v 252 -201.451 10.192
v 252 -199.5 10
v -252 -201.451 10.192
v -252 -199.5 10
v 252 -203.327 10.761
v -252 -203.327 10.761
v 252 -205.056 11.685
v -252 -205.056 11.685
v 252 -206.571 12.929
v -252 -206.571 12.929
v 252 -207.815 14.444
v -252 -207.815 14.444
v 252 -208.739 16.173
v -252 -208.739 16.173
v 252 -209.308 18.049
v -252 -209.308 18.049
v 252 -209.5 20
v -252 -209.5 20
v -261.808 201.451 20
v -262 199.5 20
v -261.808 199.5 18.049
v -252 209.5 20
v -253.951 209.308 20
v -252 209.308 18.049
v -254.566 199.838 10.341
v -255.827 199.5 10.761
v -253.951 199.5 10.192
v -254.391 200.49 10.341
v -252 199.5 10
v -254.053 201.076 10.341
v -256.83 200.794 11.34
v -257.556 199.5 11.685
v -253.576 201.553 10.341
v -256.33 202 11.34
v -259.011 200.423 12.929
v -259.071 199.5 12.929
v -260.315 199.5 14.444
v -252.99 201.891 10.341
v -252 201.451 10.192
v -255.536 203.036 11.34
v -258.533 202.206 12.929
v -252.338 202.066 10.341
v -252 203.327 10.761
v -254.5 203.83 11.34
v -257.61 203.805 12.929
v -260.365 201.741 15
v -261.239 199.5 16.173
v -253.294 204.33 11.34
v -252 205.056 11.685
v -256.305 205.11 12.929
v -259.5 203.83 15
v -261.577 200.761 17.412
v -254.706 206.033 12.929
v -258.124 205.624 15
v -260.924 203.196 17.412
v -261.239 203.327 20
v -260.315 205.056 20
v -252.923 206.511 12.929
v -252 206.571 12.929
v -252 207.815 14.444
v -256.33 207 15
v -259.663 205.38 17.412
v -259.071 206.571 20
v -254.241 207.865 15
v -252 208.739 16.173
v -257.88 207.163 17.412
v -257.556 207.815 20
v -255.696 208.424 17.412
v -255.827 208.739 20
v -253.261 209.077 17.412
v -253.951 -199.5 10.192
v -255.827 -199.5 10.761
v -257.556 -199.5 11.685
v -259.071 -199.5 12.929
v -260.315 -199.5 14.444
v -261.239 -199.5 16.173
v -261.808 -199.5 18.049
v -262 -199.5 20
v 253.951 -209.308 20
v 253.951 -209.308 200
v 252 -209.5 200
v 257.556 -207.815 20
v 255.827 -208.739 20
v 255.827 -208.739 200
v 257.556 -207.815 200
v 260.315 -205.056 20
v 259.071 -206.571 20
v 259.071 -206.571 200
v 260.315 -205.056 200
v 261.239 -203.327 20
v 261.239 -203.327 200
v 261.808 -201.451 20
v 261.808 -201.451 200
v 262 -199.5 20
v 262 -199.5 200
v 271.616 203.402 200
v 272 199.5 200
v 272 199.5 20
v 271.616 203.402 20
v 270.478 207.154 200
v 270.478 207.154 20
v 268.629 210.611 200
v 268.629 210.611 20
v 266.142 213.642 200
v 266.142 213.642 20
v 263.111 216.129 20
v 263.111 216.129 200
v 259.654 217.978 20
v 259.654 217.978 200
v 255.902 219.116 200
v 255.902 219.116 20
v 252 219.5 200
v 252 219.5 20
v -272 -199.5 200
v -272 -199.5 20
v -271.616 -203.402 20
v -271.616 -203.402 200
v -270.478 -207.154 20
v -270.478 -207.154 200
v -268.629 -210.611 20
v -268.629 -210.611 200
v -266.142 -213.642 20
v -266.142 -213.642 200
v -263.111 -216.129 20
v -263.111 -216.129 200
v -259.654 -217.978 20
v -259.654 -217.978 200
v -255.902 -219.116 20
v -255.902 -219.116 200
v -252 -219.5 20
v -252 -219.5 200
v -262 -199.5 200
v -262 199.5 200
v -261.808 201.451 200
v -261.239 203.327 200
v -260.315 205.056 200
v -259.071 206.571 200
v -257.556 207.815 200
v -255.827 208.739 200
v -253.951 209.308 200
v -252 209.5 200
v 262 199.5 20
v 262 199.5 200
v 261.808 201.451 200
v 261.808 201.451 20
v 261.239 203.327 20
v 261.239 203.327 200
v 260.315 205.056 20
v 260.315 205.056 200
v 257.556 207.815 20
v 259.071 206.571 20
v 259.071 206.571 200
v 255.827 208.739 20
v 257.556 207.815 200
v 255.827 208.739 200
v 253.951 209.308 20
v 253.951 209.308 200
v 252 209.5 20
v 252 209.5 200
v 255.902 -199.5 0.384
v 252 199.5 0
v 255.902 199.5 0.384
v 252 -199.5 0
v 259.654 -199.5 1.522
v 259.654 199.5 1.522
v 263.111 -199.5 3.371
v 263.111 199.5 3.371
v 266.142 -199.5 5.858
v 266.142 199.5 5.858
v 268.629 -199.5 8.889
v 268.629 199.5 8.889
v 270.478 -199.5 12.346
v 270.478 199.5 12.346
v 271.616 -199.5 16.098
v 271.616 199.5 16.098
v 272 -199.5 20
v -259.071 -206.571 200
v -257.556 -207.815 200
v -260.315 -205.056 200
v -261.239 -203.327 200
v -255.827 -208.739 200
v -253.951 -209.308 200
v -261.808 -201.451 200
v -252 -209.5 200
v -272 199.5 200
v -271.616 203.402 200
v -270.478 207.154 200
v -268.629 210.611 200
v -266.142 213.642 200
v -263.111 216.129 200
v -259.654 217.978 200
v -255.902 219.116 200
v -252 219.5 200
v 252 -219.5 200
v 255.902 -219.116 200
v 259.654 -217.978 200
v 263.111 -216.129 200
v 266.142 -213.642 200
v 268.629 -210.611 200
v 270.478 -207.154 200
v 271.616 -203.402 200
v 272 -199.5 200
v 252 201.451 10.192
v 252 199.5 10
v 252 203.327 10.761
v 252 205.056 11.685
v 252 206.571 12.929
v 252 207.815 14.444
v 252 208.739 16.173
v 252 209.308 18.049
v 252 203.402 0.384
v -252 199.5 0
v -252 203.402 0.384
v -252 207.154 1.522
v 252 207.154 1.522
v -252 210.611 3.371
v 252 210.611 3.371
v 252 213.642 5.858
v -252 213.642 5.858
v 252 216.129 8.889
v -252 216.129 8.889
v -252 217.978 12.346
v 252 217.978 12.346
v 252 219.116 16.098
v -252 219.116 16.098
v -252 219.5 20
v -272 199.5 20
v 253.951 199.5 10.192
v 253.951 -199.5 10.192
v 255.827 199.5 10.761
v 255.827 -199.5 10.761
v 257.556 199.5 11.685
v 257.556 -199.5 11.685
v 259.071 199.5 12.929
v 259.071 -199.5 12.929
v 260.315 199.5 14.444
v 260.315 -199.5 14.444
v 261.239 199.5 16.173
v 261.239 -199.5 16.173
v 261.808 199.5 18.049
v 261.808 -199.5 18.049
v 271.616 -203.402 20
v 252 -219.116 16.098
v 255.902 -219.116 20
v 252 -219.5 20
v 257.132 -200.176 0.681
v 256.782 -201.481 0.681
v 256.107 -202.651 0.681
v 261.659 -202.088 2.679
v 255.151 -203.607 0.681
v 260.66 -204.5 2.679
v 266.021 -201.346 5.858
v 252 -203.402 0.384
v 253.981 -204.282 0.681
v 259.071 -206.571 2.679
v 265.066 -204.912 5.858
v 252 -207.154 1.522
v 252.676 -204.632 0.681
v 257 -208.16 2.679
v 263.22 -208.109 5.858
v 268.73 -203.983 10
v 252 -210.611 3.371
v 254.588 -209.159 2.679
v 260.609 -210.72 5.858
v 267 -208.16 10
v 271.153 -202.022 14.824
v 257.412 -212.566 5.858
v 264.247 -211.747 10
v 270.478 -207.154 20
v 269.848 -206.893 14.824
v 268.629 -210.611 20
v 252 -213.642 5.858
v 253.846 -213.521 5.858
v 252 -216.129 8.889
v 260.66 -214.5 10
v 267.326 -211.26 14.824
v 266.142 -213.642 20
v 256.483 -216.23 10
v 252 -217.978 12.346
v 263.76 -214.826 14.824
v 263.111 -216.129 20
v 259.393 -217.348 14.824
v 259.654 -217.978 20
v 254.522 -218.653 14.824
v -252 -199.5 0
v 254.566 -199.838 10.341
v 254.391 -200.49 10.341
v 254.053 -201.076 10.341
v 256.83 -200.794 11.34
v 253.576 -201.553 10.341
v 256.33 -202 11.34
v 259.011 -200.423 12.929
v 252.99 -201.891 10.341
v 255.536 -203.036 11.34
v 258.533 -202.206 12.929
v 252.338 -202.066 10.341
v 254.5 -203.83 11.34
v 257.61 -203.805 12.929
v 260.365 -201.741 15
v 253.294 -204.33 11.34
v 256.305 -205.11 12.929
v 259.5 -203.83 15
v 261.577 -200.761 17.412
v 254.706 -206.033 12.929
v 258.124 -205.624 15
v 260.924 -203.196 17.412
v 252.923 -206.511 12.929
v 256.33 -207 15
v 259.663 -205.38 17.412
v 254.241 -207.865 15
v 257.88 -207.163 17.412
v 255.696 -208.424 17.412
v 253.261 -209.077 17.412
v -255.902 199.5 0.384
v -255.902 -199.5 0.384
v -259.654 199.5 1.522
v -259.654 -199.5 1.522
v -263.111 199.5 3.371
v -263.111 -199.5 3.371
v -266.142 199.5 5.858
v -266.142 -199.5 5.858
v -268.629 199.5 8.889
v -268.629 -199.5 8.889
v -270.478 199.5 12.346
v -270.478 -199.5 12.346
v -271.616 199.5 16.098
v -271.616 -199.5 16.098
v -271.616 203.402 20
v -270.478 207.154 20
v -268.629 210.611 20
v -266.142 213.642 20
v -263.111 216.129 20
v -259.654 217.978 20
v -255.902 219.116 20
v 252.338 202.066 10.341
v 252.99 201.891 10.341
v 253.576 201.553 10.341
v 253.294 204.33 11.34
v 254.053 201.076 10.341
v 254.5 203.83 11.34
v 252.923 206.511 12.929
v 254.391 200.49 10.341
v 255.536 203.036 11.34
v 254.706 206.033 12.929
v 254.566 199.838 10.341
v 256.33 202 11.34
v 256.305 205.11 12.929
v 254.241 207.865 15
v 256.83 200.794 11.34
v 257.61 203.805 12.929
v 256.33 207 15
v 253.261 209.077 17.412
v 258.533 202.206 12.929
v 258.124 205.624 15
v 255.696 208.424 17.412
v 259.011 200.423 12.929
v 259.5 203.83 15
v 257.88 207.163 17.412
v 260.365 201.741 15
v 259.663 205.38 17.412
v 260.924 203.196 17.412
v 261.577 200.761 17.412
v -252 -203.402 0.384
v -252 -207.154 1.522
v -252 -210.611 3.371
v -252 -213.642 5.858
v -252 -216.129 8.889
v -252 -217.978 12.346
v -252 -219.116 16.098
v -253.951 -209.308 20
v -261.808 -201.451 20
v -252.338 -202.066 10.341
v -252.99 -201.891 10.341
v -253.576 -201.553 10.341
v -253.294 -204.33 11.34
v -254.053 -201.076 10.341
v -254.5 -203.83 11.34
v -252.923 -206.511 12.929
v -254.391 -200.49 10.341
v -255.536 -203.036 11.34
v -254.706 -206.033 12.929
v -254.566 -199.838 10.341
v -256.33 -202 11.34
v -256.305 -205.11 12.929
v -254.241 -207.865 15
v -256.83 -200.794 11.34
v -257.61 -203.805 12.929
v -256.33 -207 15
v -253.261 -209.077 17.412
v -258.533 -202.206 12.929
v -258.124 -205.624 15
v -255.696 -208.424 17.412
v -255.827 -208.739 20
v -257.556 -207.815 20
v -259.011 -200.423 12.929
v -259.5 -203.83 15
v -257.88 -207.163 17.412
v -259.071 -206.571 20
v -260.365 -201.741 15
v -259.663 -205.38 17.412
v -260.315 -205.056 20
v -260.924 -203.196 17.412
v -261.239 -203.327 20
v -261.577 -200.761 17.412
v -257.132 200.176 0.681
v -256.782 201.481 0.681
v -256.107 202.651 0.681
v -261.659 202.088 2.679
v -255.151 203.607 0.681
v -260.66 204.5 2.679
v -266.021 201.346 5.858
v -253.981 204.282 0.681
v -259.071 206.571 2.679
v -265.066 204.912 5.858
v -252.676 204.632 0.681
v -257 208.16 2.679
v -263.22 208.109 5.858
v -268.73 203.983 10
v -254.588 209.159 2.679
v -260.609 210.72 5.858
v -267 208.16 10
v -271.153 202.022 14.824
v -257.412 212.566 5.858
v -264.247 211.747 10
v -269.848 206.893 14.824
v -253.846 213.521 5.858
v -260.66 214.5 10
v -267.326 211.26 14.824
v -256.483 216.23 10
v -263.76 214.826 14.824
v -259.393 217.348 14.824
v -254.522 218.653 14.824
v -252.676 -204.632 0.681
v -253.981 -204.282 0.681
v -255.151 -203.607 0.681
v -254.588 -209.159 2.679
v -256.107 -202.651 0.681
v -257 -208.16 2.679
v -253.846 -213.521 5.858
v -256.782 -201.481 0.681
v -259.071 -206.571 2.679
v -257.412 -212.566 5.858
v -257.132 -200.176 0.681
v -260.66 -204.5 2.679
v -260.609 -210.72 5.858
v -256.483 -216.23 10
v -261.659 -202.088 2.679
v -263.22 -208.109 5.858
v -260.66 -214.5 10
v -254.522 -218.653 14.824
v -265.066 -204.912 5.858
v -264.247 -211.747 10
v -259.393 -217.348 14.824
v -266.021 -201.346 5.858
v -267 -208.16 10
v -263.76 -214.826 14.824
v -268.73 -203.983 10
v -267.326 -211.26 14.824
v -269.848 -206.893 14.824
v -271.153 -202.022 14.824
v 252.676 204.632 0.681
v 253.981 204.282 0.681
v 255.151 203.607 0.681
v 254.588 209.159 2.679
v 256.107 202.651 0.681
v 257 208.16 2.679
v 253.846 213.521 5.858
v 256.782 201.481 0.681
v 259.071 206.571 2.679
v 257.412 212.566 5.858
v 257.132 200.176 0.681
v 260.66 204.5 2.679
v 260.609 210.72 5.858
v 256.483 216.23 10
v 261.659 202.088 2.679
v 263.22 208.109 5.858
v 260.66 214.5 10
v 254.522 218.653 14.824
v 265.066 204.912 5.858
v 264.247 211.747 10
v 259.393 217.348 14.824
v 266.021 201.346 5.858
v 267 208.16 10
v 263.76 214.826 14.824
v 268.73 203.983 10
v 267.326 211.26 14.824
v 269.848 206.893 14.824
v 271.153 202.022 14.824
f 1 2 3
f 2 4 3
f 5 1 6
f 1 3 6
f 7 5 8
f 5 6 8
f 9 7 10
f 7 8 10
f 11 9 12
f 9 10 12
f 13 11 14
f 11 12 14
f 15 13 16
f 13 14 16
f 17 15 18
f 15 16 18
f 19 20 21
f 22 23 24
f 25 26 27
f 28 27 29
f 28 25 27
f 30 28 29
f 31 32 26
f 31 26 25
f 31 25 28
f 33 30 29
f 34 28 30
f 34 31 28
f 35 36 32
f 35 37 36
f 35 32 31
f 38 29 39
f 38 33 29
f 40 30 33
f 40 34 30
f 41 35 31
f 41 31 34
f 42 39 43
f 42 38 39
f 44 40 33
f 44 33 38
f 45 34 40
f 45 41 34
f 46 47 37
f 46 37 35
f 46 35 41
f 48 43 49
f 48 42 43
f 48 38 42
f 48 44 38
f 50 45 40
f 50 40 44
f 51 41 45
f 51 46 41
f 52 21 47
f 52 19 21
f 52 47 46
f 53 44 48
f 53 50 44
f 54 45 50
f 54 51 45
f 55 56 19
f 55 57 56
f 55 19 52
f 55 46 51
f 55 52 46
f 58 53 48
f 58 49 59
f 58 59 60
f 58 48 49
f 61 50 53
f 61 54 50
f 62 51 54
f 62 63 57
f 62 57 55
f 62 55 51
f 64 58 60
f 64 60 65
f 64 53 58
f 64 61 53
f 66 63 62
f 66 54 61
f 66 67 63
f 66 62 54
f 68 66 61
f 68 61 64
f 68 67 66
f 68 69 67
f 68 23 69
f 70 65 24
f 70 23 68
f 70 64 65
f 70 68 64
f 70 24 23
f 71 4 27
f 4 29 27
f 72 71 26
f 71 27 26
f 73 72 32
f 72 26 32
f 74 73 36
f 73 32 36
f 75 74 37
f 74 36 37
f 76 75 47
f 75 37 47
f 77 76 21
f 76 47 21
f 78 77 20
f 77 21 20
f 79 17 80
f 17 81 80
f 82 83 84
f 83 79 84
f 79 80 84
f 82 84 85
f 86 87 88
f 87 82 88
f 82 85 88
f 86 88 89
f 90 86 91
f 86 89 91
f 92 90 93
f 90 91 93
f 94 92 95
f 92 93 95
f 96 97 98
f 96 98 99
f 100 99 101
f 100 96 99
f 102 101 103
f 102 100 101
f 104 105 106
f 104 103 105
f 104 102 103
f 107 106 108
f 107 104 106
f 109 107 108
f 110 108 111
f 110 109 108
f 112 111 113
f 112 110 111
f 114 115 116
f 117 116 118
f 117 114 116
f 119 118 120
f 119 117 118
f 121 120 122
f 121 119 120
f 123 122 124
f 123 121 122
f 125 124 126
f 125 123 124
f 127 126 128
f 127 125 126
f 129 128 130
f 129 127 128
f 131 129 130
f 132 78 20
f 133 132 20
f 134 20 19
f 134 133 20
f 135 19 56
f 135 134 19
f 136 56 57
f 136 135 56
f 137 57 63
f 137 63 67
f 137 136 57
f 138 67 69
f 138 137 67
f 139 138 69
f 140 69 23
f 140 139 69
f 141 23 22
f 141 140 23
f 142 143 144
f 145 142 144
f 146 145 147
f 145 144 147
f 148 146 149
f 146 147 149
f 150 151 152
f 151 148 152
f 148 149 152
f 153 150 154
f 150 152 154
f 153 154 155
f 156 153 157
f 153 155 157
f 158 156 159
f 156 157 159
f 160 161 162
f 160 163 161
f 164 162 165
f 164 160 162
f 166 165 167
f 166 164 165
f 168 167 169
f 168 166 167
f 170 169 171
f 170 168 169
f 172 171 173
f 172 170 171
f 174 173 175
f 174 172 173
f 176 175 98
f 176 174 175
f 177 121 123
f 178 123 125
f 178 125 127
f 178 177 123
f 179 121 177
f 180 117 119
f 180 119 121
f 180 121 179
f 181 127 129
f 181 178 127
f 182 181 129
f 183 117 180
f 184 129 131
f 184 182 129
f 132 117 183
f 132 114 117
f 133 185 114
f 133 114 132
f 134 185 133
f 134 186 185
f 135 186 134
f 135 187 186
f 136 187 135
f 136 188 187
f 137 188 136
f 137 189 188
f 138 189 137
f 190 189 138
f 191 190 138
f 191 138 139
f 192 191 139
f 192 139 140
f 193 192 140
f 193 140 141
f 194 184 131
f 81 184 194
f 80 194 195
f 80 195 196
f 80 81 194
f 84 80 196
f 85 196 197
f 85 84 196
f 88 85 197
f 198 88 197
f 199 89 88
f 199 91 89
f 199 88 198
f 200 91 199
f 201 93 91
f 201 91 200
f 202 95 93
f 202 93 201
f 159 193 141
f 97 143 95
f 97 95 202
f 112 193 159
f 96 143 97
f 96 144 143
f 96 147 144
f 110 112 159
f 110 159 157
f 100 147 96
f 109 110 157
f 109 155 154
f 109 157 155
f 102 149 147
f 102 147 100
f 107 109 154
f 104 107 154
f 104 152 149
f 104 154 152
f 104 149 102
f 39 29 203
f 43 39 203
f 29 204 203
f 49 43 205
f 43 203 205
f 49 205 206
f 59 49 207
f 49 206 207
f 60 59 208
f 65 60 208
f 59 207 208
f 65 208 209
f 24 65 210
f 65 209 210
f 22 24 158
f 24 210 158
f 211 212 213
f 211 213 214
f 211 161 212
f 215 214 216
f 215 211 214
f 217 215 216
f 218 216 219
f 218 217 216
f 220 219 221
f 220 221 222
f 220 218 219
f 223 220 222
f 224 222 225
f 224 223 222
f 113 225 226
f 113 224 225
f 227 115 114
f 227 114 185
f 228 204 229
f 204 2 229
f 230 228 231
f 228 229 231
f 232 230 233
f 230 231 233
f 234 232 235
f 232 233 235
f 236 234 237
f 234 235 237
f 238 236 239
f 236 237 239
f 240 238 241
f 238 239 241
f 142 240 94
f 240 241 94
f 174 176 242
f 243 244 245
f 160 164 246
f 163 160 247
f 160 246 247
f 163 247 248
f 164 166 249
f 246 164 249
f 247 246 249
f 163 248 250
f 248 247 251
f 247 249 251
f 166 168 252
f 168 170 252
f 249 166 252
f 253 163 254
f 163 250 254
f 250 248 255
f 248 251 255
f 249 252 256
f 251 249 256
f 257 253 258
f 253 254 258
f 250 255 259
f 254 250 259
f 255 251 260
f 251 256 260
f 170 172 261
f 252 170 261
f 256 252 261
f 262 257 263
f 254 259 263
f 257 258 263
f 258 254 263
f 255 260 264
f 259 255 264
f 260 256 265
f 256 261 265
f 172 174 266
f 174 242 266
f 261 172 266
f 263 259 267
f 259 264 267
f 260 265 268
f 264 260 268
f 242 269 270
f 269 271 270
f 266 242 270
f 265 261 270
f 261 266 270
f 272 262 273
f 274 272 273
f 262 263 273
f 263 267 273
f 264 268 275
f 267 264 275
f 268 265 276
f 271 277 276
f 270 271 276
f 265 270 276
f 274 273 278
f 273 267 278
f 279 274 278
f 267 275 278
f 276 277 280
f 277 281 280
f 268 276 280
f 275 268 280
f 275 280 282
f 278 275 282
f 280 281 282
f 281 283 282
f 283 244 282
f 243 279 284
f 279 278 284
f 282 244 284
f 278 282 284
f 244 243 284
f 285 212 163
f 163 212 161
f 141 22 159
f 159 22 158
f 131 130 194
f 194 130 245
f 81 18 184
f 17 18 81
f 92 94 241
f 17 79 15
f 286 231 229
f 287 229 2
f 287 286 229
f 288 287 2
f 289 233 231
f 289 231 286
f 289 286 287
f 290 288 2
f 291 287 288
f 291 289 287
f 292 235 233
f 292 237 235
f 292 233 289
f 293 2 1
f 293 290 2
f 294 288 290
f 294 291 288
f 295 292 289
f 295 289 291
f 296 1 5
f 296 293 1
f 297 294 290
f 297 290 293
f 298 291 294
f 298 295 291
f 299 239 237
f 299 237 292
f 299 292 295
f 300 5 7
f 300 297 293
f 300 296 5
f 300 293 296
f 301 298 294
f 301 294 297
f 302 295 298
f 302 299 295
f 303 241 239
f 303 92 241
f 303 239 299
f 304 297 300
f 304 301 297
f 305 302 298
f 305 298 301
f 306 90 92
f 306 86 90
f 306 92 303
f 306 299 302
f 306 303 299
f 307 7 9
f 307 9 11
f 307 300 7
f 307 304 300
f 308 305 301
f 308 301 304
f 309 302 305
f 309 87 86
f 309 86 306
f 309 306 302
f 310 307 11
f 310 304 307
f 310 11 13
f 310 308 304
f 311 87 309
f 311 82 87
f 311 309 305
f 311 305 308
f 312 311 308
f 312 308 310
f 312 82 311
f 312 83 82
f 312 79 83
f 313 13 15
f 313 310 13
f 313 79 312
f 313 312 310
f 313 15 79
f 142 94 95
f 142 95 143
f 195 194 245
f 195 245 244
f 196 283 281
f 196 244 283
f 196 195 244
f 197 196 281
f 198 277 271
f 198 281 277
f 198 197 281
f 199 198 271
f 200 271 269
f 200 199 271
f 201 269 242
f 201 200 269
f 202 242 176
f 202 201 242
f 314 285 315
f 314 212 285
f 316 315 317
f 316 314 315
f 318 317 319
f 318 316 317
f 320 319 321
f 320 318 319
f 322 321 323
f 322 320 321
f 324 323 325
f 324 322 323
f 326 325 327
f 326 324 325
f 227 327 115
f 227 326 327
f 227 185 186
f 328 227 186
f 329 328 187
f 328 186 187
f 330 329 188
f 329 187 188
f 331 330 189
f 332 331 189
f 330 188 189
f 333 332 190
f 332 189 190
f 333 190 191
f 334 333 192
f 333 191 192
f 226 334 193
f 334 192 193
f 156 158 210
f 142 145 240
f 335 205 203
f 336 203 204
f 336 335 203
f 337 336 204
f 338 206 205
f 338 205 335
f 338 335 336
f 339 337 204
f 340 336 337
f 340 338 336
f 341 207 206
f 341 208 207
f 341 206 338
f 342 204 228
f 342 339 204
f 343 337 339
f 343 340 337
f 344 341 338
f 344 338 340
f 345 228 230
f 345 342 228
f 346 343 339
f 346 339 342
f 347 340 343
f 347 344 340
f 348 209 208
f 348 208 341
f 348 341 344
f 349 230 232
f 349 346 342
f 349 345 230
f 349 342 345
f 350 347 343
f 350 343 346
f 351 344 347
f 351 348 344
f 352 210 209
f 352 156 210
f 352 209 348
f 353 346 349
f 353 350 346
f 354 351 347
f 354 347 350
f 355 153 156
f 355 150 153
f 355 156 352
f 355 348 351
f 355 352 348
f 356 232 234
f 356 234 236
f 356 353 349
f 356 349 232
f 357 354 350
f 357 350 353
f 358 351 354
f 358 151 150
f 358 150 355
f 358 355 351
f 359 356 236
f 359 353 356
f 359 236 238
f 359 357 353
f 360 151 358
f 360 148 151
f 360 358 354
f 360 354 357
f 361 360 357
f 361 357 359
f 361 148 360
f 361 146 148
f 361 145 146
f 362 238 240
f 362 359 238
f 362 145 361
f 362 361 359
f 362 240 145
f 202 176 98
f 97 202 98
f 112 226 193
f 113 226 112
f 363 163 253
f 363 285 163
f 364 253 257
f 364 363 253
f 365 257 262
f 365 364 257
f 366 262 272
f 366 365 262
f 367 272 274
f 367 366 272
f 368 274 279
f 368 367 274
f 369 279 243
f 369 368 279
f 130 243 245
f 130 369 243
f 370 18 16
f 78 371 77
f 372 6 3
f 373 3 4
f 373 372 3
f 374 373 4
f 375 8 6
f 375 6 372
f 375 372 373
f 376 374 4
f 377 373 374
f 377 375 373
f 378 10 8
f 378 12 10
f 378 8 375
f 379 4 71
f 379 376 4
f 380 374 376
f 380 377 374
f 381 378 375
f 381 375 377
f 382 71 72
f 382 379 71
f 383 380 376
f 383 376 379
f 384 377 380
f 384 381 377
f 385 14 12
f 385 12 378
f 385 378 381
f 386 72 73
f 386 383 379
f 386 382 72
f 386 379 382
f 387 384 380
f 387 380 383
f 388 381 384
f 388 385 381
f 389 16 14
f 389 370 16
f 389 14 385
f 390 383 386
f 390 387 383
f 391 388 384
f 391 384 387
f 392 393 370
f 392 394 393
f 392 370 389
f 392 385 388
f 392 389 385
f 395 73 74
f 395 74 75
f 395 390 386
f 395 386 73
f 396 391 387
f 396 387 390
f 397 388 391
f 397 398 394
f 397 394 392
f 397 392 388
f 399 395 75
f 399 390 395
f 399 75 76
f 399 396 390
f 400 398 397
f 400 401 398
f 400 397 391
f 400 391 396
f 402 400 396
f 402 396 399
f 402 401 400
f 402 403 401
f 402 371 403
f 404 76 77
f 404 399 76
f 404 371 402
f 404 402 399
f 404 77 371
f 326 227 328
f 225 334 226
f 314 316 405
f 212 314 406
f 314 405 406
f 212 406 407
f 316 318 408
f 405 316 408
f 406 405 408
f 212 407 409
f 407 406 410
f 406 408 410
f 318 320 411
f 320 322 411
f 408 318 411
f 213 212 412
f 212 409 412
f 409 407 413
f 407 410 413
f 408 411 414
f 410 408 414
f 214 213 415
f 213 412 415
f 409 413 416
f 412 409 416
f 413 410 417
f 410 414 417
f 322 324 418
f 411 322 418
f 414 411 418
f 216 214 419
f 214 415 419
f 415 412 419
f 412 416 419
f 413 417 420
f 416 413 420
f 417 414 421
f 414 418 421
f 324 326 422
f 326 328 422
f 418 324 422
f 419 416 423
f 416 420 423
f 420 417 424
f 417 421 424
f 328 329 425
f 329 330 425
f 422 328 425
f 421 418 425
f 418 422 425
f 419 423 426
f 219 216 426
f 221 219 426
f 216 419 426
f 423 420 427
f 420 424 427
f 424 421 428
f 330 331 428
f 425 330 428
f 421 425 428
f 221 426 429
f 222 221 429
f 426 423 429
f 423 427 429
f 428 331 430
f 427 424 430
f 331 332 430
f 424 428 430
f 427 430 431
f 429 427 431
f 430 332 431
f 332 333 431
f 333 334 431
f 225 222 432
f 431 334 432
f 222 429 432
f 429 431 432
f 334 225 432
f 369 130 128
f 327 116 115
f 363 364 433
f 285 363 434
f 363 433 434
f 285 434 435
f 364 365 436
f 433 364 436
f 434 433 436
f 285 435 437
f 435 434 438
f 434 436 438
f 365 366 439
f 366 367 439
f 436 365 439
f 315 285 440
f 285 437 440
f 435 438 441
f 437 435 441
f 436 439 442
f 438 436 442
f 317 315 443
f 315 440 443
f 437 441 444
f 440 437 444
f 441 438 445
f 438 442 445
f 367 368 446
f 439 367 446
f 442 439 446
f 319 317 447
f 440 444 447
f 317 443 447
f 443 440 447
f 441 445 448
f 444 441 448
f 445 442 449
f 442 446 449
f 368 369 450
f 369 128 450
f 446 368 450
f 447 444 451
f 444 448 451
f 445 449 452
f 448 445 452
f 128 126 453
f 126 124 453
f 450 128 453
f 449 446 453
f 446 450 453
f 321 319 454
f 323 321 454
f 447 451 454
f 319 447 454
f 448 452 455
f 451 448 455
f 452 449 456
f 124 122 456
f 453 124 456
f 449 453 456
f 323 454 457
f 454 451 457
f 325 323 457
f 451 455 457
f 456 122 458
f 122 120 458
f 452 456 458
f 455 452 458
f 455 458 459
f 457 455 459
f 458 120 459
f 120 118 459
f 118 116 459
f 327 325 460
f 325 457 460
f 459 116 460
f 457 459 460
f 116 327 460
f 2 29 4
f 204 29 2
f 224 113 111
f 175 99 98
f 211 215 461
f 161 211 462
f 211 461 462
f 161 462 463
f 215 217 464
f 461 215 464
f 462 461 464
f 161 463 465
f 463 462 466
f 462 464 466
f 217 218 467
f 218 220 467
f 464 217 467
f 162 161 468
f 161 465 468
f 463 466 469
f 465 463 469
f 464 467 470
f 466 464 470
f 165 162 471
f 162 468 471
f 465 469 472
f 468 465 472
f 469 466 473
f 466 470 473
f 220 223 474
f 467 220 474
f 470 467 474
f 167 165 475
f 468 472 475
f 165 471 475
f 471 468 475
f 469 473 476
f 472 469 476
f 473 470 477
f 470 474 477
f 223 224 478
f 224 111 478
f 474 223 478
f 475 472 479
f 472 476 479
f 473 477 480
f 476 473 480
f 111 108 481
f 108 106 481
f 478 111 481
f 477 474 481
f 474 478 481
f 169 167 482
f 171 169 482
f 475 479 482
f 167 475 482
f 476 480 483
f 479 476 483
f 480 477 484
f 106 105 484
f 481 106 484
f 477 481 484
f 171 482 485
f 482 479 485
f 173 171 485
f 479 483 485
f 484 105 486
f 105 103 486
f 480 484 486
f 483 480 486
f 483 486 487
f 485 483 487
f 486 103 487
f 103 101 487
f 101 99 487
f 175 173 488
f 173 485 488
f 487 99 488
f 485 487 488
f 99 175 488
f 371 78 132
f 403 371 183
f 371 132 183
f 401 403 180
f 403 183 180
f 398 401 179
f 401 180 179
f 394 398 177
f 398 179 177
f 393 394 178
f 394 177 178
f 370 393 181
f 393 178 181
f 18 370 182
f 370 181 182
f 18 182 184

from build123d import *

# Parameters (mm, degrees)
F0_W     = 544
F0_H     = 439
F1_DEPTH = 200
F2_R     = 20
F3_R     = 20
F4_T     = -10


with BuildPart() as f1:
    # F0 (on Top) → F1 (new body)
    with BuildSketch(Plane.XY):
        Rectangle(F0_W, F0_H)
    extrude(amount=F1_DEPTH)

    # F2
    f2_edges = [f1.edges().sort_by_distance(p)[0] for p in [
        (-272, -219.5, 100),
        (272, -219.5, 100),
        (272, 219.5, 100),
        (-272, 219.5, 100),
    ]]
    fillet(f2_edges, radius=F2_R)

    # F3
    f3_edges = [f1.edges().sort_by_distance(p)[0] for p in [
        (0, 219.5, 0),
    ]]
    fillet(f3_edges, radius=F3_R)

    # F4
    f4_openings = [f1.faces().sort_by_distance(p)[0] for p in [
        (0, 0, 200),
    ]]
    offset(amount=F4_T, openings=f4_openings)


solid = f1.part
